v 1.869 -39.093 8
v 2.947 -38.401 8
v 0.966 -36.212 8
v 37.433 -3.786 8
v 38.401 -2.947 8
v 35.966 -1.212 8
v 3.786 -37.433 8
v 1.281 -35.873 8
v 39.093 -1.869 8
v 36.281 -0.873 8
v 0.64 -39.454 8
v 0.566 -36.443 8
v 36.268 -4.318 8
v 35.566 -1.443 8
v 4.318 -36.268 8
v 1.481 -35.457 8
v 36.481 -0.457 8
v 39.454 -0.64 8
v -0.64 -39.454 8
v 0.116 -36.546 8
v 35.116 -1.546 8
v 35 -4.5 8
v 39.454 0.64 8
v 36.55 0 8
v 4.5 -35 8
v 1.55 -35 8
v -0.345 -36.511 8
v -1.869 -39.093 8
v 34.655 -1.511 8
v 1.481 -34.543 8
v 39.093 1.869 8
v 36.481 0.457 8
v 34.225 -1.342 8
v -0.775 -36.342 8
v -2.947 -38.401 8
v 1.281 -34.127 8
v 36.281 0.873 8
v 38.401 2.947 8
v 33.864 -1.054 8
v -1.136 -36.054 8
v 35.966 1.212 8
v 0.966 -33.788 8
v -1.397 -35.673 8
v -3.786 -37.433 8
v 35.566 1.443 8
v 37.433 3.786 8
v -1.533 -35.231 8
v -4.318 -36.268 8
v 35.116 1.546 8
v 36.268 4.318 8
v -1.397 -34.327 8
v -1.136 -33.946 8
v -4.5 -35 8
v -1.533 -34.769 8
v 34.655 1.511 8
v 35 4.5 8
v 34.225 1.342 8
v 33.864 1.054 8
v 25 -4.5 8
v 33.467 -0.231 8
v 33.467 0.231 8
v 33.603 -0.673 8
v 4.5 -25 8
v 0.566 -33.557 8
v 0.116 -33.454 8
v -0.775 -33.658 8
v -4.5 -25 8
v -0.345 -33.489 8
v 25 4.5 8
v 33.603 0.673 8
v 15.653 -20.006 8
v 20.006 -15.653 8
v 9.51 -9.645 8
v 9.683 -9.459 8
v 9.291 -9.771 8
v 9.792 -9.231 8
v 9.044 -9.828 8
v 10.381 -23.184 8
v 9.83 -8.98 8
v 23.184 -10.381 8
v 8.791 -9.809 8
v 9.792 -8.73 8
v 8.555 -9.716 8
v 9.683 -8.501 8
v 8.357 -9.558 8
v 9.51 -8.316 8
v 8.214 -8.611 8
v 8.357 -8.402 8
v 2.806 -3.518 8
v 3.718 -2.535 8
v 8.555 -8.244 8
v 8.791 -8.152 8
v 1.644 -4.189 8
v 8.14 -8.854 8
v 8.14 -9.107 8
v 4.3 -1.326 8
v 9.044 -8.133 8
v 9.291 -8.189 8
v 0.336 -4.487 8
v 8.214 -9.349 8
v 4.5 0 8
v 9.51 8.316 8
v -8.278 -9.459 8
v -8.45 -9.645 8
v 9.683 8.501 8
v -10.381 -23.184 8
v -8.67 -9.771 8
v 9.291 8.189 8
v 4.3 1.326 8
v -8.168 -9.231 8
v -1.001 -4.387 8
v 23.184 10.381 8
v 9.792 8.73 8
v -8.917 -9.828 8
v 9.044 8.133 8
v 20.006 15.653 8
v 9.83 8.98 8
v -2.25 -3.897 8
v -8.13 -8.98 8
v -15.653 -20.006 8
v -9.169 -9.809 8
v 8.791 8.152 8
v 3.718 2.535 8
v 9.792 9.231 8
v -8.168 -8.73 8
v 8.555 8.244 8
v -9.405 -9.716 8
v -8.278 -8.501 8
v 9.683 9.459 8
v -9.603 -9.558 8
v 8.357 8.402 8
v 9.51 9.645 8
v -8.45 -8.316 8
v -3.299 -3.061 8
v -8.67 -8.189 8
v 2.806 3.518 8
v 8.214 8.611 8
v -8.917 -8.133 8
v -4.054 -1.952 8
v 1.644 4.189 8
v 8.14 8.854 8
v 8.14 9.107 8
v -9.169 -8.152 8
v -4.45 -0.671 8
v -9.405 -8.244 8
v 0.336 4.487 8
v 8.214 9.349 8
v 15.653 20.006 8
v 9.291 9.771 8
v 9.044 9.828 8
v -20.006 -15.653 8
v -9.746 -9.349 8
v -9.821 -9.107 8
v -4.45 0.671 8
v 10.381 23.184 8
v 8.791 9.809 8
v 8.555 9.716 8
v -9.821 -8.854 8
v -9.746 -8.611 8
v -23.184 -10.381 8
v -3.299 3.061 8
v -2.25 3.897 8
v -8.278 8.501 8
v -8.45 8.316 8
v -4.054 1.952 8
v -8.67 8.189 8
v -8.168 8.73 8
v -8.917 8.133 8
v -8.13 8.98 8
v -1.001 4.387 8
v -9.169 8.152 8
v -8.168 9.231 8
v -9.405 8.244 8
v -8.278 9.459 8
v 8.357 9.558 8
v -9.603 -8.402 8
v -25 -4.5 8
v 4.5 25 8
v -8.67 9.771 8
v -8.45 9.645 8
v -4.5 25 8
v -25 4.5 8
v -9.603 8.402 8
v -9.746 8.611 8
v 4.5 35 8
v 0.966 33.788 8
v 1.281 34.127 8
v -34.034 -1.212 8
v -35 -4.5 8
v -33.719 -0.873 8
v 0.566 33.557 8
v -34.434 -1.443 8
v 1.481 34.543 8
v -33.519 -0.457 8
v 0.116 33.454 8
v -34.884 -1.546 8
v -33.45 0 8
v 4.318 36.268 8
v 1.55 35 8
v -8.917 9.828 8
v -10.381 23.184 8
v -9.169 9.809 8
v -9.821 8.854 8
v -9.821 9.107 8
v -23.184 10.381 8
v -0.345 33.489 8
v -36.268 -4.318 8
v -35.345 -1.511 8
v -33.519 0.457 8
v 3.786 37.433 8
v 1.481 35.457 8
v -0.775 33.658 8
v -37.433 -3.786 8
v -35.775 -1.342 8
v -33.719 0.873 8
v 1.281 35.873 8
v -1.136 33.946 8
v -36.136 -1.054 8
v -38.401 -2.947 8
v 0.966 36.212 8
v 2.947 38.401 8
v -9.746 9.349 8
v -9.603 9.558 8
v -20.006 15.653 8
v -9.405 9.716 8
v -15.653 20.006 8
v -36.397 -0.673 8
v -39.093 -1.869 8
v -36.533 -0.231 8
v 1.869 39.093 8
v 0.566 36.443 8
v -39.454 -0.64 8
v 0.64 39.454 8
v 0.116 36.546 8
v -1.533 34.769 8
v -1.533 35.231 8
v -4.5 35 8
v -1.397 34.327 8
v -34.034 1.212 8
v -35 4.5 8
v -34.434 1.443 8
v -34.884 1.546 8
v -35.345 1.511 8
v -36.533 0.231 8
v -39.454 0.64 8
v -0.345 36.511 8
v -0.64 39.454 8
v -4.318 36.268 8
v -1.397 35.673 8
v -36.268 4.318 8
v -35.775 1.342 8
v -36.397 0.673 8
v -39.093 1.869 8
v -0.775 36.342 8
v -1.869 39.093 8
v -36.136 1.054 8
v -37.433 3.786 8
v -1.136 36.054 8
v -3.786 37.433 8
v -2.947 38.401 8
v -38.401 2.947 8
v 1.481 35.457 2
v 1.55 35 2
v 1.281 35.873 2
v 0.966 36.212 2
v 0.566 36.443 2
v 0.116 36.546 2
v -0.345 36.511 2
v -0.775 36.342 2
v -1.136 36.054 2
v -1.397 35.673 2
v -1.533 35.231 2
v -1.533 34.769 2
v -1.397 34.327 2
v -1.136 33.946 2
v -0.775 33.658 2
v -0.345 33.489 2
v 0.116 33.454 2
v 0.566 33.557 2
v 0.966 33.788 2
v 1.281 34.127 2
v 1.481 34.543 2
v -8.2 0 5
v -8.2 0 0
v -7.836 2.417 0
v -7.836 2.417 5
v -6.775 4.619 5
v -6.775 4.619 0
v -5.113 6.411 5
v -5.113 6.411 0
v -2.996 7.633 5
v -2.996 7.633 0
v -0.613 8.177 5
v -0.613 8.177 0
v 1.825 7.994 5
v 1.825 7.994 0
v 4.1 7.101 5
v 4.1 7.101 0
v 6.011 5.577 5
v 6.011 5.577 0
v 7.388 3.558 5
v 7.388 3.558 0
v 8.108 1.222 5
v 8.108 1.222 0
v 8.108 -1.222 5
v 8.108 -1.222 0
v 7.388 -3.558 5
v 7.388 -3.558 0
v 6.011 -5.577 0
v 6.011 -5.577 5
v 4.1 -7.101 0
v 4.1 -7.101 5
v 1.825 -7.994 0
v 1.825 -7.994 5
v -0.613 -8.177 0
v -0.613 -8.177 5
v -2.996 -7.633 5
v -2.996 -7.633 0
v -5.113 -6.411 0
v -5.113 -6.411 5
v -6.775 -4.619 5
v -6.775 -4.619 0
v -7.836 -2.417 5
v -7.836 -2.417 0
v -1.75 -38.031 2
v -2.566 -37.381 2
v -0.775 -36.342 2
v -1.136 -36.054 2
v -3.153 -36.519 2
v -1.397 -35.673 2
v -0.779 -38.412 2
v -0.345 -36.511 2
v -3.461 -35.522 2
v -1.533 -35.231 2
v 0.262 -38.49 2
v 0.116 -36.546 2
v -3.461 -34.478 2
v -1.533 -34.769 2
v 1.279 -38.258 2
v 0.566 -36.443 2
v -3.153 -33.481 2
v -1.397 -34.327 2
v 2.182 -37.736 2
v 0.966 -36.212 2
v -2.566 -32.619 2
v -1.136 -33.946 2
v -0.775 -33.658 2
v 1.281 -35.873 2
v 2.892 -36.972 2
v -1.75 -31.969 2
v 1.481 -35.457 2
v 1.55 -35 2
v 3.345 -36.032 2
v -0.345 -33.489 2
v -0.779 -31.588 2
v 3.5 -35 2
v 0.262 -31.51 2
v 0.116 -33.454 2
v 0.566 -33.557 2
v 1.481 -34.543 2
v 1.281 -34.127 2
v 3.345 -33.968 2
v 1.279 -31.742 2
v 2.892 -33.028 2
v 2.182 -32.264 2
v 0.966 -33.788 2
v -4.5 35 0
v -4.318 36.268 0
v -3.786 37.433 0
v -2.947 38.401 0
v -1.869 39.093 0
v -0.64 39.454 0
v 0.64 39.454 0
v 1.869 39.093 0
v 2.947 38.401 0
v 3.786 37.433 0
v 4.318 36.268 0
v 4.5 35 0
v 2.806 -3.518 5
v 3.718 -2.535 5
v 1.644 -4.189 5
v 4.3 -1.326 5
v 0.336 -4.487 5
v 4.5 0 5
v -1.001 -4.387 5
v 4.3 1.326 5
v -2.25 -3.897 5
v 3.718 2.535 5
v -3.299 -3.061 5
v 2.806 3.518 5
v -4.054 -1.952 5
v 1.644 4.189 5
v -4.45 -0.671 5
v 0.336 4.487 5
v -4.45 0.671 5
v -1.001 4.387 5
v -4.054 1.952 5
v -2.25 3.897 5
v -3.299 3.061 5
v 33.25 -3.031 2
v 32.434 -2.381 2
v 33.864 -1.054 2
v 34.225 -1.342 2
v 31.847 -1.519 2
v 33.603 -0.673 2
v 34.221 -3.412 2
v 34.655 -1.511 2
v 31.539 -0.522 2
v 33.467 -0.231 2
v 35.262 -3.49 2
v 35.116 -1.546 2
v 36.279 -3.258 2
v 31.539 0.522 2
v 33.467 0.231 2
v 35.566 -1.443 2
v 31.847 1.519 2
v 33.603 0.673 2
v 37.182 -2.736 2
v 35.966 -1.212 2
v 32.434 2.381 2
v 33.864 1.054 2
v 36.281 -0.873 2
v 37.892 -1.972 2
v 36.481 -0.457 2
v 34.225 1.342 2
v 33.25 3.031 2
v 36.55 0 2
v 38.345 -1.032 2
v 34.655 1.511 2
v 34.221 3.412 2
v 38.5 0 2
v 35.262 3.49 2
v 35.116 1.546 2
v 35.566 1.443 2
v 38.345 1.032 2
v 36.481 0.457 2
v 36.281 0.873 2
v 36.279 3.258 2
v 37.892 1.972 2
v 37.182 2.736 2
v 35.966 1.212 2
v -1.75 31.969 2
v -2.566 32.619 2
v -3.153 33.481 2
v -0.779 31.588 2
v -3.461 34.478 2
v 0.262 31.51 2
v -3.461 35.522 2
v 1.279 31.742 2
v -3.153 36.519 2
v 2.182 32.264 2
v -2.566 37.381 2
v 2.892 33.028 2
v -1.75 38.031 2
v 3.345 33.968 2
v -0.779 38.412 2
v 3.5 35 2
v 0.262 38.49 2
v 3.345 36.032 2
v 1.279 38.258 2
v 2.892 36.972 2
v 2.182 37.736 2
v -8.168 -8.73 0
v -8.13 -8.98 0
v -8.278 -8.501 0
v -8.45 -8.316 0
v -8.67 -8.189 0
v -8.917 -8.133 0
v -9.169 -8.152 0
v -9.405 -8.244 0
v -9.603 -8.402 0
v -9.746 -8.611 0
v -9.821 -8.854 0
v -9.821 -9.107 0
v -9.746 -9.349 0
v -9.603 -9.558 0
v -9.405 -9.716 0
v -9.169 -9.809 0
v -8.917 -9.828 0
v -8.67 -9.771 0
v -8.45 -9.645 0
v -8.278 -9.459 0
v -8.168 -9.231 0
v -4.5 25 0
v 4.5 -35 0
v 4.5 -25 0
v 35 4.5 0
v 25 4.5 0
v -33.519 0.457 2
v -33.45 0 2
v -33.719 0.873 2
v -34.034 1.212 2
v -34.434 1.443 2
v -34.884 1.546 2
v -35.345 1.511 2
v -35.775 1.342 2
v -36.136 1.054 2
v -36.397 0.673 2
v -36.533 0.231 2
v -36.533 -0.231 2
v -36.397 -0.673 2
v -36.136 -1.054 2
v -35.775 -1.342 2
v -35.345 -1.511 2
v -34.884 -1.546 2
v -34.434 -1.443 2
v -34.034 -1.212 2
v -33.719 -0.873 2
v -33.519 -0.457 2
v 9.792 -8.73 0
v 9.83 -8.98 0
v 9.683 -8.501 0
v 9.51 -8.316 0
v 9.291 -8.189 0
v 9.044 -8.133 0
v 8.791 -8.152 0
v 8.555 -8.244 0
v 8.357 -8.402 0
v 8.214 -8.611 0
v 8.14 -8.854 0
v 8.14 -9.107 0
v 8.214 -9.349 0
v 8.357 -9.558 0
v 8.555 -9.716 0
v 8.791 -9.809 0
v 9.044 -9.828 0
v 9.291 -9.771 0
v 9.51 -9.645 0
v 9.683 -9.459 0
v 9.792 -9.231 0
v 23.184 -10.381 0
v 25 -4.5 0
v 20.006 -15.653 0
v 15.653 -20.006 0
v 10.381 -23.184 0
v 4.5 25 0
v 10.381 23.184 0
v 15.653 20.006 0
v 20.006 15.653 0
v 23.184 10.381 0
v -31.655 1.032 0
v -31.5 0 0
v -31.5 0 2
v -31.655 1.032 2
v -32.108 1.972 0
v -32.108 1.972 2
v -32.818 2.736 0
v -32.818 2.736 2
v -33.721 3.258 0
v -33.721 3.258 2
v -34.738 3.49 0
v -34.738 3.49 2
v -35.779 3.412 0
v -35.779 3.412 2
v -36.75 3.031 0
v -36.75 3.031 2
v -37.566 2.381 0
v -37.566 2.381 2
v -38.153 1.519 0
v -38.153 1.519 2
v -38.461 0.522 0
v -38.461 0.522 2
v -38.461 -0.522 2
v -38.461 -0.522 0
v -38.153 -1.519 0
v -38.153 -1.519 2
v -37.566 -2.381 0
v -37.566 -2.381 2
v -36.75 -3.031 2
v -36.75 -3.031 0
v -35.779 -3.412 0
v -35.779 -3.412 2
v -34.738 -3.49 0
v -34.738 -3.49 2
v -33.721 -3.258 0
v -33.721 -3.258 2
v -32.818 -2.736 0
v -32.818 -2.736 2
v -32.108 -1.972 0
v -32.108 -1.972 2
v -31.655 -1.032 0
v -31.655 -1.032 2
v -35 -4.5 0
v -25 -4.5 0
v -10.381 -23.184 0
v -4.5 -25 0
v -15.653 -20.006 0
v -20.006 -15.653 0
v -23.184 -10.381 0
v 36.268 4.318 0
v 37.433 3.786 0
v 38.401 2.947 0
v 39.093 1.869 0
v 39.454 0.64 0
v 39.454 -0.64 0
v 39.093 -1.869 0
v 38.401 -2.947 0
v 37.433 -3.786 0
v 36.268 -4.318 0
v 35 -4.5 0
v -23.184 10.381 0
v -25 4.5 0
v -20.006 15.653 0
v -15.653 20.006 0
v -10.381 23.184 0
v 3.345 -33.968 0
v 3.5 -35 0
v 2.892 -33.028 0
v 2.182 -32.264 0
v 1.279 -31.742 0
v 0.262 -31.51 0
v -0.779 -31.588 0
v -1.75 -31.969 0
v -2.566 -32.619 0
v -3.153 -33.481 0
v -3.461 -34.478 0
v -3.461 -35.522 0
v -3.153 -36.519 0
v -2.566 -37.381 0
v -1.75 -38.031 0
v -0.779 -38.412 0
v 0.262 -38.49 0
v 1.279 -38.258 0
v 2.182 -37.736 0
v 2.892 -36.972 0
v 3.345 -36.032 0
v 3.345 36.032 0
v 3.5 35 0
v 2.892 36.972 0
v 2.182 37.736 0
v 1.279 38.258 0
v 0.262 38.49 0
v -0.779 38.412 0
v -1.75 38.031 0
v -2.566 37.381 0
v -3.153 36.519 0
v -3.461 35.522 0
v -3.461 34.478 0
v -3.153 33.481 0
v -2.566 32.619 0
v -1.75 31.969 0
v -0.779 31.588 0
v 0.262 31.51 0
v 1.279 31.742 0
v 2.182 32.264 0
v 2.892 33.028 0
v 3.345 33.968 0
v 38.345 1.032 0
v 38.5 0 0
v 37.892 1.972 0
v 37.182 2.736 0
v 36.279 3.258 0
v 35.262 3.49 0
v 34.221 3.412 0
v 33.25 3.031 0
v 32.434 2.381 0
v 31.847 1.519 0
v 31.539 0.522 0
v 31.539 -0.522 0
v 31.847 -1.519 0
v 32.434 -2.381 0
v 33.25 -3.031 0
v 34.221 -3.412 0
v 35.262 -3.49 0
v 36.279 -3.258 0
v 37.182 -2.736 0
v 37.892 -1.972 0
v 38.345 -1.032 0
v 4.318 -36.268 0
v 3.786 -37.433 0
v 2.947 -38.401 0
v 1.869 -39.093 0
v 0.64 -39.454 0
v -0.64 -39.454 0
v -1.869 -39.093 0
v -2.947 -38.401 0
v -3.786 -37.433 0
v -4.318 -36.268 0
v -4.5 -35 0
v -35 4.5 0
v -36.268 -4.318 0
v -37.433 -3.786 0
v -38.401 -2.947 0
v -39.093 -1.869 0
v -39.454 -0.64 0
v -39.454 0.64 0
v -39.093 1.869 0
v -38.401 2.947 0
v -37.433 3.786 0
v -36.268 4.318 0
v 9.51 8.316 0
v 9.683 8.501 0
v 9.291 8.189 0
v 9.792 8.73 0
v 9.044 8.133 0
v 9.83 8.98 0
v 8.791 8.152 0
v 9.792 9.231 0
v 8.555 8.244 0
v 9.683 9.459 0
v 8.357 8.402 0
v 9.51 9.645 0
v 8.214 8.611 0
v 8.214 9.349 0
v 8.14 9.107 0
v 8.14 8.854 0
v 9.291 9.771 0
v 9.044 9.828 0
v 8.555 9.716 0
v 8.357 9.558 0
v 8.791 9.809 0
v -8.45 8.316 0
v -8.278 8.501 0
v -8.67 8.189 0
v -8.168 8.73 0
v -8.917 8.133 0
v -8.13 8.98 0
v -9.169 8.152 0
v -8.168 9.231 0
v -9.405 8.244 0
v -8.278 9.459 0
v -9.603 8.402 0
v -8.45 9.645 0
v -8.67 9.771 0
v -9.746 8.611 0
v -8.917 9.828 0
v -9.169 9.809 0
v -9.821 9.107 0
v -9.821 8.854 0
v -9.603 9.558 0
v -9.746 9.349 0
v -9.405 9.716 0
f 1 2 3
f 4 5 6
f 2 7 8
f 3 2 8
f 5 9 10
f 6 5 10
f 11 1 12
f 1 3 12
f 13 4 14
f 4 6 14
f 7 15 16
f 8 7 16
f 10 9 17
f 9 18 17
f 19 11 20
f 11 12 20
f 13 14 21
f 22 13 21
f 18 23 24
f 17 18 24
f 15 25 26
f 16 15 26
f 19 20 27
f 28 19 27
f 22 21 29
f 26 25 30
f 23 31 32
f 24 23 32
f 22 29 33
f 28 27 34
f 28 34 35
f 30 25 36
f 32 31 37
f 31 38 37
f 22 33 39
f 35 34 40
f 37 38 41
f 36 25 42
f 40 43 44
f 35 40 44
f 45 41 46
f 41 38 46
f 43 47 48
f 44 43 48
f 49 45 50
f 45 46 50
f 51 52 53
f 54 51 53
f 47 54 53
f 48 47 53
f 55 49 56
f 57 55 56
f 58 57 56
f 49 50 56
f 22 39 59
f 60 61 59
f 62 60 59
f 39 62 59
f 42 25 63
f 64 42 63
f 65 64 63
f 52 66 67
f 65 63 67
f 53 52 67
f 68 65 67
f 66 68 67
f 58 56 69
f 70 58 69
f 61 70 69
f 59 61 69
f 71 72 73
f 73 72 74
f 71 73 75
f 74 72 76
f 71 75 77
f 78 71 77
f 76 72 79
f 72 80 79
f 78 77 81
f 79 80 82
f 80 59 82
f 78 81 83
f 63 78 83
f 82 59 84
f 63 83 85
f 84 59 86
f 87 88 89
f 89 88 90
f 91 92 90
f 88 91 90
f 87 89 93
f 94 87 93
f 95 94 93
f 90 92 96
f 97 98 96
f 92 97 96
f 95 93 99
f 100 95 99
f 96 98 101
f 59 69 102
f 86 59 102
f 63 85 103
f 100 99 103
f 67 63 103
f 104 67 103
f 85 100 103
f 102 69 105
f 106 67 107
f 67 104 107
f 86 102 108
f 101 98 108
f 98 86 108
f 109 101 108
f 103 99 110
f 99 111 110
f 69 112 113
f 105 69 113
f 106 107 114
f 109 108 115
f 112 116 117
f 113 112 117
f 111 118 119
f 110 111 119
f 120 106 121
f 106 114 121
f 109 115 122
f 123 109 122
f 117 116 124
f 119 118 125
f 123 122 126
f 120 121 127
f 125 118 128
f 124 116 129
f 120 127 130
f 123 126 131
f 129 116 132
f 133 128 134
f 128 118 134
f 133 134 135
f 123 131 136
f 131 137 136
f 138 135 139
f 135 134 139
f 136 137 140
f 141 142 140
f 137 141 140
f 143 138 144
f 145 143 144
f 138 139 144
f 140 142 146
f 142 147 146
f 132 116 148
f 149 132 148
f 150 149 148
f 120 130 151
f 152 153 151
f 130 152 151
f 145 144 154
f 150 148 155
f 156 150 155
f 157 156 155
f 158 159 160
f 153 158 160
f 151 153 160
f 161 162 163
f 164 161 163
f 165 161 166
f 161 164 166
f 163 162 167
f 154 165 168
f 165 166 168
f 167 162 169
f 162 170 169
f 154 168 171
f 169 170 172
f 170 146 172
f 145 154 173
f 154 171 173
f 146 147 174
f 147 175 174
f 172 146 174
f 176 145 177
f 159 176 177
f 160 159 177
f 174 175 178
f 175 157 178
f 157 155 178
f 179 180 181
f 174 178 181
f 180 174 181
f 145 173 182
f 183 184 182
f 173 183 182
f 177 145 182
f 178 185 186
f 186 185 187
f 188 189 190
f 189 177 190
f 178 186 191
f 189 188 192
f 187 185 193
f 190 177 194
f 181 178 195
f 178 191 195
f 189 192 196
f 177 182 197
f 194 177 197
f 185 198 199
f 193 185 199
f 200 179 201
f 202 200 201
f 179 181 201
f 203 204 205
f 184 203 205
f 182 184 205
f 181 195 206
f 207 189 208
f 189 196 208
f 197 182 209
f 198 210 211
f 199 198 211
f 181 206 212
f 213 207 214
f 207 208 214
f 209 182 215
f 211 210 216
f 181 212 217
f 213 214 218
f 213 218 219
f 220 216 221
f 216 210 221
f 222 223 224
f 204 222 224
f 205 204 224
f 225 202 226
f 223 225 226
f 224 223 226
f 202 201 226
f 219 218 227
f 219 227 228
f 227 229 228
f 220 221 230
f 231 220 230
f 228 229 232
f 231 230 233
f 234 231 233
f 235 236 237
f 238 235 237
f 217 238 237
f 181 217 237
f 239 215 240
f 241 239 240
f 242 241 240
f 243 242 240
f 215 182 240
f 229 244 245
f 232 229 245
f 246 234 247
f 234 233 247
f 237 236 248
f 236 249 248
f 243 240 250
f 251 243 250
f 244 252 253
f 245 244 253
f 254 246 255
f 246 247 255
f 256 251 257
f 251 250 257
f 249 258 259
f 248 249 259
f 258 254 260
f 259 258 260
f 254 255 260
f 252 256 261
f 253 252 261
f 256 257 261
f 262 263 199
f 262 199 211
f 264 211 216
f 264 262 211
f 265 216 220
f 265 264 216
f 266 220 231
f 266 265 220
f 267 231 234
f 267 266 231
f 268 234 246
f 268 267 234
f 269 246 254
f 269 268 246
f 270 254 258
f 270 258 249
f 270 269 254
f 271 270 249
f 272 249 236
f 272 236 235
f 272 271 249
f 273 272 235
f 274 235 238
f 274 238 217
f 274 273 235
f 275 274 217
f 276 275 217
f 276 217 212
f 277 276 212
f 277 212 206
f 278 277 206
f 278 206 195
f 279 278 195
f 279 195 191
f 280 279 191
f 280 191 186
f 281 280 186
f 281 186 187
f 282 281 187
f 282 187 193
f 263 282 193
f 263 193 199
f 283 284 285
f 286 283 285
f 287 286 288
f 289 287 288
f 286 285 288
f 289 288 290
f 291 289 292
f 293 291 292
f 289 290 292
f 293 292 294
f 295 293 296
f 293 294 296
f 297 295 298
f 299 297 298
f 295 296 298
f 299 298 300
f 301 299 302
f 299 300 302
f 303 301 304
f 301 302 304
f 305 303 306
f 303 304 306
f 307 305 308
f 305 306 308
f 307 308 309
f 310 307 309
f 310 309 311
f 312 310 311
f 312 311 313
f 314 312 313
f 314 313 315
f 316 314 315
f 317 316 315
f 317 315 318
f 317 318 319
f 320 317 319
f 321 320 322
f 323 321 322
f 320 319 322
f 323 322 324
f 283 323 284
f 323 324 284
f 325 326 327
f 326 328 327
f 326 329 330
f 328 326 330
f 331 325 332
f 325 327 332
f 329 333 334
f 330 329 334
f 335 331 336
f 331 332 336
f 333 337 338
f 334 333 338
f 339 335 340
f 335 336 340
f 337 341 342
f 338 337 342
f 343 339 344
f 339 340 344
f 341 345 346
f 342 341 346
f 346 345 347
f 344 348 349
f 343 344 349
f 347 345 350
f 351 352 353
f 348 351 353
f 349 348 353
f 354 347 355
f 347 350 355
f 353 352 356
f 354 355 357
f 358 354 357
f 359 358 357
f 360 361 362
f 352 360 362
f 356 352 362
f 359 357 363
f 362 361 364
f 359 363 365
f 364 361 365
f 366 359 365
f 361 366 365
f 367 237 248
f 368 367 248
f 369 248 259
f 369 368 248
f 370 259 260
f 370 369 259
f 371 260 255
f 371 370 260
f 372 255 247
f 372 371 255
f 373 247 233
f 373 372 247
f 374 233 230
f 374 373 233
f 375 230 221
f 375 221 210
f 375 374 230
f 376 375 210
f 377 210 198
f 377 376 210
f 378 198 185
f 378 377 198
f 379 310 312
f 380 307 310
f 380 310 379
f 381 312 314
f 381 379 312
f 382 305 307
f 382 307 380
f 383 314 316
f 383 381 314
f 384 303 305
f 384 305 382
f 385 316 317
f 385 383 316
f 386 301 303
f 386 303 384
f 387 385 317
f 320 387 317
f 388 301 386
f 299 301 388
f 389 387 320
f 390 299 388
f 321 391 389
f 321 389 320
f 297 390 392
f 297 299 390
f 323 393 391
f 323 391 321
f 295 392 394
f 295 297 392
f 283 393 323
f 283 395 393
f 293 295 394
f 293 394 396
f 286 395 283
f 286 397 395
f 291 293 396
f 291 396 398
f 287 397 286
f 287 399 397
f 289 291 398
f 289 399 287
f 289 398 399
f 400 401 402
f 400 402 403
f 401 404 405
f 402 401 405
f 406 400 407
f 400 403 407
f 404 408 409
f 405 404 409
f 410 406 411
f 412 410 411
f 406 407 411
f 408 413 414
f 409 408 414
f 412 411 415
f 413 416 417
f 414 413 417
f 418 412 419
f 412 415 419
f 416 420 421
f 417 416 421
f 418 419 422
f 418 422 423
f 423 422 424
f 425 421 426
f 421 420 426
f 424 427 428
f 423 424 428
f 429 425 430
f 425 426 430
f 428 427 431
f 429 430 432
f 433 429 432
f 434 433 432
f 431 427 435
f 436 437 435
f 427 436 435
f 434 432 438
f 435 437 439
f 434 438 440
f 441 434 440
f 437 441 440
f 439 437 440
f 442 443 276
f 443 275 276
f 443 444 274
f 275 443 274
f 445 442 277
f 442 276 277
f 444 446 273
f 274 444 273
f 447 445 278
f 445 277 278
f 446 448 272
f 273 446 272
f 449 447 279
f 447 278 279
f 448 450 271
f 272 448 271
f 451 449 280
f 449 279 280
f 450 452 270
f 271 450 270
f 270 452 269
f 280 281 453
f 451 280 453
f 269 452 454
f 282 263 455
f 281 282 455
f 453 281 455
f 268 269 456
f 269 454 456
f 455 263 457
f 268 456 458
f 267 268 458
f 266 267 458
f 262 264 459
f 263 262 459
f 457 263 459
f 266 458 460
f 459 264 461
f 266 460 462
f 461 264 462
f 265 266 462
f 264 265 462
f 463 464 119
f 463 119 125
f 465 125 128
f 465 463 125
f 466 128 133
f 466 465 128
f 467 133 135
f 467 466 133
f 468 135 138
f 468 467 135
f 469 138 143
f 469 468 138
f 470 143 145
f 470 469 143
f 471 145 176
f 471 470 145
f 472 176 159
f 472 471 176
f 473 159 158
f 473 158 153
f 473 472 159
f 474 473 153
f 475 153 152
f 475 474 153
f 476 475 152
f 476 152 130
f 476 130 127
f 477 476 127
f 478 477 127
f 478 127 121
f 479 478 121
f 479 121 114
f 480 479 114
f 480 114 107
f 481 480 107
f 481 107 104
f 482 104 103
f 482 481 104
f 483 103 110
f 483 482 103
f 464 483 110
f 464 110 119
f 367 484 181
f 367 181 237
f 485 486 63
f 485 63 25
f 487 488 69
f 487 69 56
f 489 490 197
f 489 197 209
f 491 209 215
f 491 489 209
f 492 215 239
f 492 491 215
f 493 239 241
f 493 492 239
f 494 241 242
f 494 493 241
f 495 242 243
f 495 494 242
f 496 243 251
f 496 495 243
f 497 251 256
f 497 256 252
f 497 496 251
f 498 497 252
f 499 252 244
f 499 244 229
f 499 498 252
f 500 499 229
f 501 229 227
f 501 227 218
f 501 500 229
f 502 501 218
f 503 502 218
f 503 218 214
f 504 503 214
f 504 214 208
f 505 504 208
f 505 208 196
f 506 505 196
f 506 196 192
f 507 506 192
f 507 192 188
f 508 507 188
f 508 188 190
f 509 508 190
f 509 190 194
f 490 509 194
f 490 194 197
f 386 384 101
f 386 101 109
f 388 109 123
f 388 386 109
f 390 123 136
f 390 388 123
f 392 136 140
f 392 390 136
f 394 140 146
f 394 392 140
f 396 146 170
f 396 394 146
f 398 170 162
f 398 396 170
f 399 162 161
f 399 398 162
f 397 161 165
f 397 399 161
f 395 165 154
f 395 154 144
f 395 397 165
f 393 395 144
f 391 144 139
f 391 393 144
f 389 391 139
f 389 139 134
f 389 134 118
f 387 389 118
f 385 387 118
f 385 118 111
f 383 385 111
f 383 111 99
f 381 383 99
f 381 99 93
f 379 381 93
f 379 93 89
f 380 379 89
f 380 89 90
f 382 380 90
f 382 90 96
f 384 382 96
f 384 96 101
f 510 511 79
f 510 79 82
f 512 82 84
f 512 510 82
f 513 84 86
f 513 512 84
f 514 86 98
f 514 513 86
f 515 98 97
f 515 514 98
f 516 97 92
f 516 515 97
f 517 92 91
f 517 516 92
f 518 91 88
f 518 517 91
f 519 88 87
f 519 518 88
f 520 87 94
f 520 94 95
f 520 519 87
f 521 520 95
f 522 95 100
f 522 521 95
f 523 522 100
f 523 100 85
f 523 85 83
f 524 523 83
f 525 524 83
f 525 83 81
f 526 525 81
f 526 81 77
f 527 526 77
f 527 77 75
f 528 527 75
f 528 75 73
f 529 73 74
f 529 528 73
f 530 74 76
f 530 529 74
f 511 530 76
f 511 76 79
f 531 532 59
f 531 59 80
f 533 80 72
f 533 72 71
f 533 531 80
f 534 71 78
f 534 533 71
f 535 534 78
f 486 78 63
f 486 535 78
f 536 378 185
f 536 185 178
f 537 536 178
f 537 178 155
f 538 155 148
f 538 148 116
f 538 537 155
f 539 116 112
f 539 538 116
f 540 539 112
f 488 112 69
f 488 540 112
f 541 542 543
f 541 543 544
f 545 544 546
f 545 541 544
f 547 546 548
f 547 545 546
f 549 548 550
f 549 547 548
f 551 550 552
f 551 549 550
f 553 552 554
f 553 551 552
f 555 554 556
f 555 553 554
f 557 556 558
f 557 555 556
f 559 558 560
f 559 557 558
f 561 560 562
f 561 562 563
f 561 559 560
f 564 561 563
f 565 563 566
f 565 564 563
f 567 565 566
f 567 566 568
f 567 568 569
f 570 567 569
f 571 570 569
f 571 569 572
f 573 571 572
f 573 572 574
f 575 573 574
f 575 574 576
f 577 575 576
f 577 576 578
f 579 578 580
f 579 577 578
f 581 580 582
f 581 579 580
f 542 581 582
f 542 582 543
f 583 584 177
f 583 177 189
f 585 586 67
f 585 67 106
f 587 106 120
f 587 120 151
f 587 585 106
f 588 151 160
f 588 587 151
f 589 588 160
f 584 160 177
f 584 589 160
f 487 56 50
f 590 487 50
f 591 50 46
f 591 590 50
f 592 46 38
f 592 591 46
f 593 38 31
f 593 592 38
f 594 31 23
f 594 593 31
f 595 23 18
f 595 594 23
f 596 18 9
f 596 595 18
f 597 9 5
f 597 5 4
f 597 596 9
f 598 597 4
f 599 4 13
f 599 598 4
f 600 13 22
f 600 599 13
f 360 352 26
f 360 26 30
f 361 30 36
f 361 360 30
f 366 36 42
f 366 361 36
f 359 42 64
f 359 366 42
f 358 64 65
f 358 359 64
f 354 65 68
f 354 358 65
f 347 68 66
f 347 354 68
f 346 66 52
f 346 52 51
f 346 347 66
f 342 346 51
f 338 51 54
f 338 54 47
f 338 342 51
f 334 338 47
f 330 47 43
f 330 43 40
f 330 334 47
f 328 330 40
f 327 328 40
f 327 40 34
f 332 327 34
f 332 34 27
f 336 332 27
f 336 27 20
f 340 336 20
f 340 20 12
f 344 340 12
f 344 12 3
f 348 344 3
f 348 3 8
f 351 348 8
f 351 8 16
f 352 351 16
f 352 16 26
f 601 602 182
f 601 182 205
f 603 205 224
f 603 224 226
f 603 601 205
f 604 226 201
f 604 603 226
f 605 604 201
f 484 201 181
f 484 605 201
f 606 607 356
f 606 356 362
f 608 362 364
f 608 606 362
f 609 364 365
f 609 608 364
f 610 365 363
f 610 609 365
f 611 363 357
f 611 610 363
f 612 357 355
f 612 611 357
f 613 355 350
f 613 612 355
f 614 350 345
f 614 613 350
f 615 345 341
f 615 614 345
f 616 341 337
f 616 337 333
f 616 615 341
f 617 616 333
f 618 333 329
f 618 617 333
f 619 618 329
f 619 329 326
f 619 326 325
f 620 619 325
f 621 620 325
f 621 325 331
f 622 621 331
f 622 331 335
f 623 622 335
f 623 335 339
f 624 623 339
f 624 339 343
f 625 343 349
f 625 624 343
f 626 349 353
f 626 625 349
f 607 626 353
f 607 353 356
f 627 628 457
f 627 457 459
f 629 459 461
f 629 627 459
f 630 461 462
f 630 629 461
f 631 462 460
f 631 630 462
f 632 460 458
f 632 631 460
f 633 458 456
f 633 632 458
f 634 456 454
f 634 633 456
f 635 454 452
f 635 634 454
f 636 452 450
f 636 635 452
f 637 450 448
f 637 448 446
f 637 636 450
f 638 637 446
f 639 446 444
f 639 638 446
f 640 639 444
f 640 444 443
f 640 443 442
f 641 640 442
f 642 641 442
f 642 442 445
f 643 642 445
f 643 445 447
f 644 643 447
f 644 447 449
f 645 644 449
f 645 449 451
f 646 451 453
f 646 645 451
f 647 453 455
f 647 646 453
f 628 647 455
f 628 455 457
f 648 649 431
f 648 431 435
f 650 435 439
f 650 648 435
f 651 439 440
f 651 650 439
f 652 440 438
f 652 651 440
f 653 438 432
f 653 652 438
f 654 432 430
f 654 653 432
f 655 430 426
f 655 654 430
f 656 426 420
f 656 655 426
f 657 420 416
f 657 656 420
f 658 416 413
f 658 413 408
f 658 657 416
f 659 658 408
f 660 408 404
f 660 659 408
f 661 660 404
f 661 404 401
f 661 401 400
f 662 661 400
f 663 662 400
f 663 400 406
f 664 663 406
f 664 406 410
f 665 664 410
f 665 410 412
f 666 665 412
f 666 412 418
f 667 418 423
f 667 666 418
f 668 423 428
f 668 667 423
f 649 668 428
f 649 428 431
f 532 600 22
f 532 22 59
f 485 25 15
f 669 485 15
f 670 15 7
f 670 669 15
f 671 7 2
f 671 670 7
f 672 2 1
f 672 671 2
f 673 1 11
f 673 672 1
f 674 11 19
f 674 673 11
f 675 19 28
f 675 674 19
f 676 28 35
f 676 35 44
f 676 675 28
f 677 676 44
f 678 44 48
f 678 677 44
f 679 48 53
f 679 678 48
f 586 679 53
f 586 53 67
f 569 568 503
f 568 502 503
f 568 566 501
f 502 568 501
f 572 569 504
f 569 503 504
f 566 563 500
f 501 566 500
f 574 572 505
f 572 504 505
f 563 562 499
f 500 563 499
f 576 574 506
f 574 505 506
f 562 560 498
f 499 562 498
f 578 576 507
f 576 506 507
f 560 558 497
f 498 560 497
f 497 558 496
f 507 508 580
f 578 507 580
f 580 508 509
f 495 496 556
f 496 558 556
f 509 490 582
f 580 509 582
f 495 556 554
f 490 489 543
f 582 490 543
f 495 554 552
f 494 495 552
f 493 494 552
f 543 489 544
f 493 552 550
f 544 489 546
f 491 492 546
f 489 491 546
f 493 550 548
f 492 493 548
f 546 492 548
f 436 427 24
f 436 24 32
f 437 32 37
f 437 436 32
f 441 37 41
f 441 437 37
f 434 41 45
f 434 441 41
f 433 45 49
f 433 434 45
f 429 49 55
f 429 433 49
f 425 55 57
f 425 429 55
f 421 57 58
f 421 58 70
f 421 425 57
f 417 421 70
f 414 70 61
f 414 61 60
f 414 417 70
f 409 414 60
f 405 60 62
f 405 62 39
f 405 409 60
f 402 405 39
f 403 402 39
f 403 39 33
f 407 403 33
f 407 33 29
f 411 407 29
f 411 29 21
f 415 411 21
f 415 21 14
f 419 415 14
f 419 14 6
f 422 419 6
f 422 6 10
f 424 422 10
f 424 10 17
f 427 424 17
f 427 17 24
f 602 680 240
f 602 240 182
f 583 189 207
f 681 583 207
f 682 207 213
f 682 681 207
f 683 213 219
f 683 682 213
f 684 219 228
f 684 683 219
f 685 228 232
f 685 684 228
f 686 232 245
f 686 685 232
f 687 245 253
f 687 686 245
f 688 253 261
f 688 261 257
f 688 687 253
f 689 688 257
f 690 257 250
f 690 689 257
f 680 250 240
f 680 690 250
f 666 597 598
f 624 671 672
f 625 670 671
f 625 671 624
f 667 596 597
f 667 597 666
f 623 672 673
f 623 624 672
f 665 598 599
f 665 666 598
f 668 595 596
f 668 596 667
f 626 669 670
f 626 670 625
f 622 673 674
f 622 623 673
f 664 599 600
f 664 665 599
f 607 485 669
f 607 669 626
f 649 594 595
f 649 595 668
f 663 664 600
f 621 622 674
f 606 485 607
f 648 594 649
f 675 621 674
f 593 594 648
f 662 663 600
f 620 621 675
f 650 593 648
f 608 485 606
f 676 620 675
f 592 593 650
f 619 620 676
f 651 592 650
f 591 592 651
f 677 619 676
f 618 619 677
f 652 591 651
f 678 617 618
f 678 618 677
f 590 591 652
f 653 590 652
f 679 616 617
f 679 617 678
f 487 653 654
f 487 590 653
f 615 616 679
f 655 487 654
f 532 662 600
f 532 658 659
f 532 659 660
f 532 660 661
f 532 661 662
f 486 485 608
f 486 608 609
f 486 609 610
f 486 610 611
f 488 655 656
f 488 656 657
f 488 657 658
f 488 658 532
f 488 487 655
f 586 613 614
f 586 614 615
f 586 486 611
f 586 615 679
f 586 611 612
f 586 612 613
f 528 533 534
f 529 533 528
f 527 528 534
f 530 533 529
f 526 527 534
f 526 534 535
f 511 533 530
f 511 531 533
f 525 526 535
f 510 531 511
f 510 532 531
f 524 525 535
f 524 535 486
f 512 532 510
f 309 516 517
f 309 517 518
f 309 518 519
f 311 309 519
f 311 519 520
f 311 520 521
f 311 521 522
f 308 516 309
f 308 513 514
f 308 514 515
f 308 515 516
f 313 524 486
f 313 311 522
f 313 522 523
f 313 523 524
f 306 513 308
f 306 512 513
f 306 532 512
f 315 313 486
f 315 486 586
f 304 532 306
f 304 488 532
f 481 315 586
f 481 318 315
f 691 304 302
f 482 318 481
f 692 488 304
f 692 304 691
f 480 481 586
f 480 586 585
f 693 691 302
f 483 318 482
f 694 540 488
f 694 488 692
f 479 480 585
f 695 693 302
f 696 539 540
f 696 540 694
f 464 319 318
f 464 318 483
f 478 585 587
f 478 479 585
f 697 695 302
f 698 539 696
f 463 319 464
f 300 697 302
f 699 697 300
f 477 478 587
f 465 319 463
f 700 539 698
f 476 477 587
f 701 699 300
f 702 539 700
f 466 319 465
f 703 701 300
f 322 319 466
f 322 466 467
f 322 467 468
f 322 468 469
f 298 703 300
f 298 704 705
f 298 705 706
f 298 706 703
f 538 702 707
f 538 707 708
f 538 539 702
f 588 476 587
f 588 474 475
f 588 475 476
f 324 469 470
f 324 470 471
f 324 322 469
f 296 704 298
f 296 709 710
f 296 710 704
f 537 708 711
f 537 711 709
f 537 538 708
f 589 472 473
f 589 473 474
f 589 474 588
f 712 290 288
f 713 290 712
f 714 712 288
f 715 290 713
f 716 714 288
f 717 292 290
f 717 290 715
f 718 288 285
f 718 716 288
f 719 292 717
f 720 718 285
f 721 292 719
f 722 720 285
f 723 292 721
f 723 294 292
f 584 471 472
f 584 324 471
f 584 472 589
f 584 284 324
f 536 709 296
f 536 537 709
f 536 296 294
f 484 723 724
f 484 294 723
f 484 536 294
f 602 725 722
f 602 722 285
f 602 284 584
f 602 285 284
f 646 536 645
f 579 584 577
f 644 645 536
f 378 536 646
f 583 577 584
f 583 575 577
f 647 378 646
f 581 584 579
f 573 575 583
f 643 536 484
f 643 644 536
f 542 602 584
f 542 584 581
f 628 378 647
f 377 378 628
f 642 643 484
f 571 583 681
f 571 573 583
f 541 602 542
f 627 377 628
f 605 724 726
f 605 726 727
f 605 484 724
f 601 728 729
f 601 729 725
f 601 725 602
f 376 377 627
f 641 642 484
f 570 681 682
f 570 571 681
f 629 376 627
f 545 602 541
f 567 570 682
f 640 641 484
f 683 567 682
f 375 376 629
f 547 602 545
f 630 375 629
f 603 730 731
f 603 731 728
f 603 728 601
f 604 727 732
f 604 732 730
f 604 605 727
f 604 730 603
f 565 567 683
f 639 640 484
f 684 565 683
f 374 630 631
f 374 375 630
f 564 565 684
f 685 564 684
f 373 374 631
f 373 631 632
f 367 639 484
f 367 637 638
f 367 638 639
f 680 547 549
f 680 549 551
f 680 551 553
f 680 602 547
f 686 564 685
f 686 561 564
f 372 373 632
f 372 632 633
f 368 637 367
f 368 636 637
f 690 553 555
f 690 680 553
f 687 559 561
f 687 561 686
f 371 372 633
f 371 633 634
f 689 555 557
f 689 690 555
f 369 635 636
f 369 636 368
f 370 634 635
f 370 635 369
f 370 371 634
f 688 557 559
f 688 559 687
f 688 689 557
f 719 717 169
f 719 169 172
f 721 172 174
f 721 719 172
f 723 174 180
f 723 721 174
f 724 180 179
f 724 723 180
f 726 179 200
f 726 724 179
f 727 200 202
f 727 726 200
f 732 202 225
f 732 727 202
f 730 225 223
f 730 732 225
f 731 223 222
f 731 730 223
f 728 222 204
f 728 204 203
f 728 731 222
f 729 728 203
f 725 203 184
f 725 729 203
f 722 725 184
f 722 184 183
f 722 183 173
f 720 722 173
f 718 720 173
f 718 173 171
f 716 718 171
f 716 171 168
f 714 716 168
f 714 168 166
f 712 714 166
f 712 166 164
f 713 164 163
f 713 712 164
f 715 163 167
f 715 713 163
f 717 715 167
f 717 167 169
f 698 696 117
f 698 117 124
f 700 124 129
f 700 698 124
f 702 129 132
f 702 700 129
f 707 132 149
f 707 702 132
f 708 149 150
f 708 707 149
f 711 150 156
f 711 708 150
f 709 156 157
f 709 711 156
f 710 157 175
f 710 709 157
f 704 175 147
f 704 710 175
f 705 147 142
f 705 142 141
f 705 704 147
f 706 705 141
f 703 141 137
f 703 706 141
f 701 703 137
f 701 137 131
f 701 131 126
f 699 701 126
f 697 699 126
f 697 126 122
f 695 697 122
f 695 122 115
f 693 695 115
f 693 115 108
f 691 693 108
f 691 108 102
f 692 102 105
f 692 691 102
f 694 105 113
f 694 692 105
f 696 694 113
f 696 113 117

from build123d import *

# Parameters (mm, degrees)
SKETCH1_R           = 4.5
SKETCH1_R_2         = 0.85
SKETCH1_R_3         = 1.55
BOSS_EXTRUDE2_DEPTH = 8
SKETCH5_R           = 8.2
CUT_EXTRUDE3_DEPTH  = 5
SKETCH6_R           = 3.5
CUT_EXTRUDE6_DEPTH  = 2


with BuildPart() as part:
    # Sketch1 → Boss-Extrude2 (new body)
    with BuildSketch(Plane.XY):
        with BuildLine():
            Line((-35, 4.5), (-25, 4.5))
            ThreePointArc((-25, 4.5), (-17.961764947, 17.961764947), (-4.5, 25))
            Line((-4.5, 25), (-4.5, 35))
            ThreePointArc((-4.5, 35), (0, 39.5), (4.5, 35))
            Line((4.5, 35), (4.5, 25))
            ThreePointArc((4.5, 25), (17.961764947, 17.961764947), (25, 4.5))
            Line((25, 4.5), (35, 4.5))
            ThreePointArc((35, 4.5), (39.5, 0), (35, -4.5))
            Line((35, -4.5), (25, -4.5))
            ThreePointArc((25, -4.5), (17.961764947, -17.961764947), (4.5, -25))
            Line((4.5, -25), (4.5, -35))
            ThreePointArc((4.5, -35), (0, -39.5), (-4.5, -35))
            Line((-4.5, -35), (-4.5, -25))
            ThreePointArc((-4.5, -25), (-17.961764947, -17.961764947), (-25, -4.5))
            Line((-25, -4.5), (-35, -4.5))
            ThreePointArc((-35, -4.5), (-39.5, 0), (-35, 4.5))
        make_face()
        Circle(SKETCH1_R, mode=Mode.SUBTRACT)
        with Locations((8.980256121, 8.980256121)):
            Circle(SKETCH1_R_2, mode=Mode.SUBTRACT)
        with Locations((8.980256121, -8.980256121)):
            Circle(SKETCH1_R_2, mode=Mode.SUBTRACT)
        with Locations((-8.980256121, -8.980256121)):
            Circle(SKETCH1_R_2, mode=Mode.SUBTRACT)
        with Locations((-8.980256121, 8.980256121)):
            Circle(SKETCH1_R_2, mode=Mode.SUBTRACT)
        with Locations((-35, 0)):
            Circle(SKETCH1_R_3, mode=Mode.SUBTRACT)
        with Locations((0, 35)):
            Circle(SKETCH1_R_3, mode=Mode.SUBTRACT)
        with Locations((35, 0)):
            Circle(SKETCH1_R_3, mode=Mode.SUBTRACT)
        with Locations((0, -35)):
            Circle(SKETCH1_R_3, mode=Mode.SUBTRACT)
    extrude(amount=BOSS_EXTRUDE2_DEPTH)

    # Sketch5 → Cut-Extrude3 (cut)
    with BuildSketch(Plane(origin=(0, 0, 0), x_dir=(-1, 0, 0), z_dir=(0, 0, -1))):
        Circle(SKETCH5_R)
    extrude(amount=-CUT_EXTRUDE3_DEPTH, mode=Mode.SUBTRACT)

    # Sketch6 → Cut-Extrude6 (cut)
    with BuildSketch(Plane.XY):
        with Locations((0, 35)):
            Circle(SKETCH6_R)
        with Locations((35, 0)):
            Circle(SKETCH6_R)
        with Locations((0, -35)):
            Circle(SKETCH6_R)
        with Locations((-35, 0)):
            Circle(SKETCH6_R)
    extrude(amount=CUT_EXTRUDE6_DEPTH, mode=Mode.SUBTRACT)


solid = part.part
